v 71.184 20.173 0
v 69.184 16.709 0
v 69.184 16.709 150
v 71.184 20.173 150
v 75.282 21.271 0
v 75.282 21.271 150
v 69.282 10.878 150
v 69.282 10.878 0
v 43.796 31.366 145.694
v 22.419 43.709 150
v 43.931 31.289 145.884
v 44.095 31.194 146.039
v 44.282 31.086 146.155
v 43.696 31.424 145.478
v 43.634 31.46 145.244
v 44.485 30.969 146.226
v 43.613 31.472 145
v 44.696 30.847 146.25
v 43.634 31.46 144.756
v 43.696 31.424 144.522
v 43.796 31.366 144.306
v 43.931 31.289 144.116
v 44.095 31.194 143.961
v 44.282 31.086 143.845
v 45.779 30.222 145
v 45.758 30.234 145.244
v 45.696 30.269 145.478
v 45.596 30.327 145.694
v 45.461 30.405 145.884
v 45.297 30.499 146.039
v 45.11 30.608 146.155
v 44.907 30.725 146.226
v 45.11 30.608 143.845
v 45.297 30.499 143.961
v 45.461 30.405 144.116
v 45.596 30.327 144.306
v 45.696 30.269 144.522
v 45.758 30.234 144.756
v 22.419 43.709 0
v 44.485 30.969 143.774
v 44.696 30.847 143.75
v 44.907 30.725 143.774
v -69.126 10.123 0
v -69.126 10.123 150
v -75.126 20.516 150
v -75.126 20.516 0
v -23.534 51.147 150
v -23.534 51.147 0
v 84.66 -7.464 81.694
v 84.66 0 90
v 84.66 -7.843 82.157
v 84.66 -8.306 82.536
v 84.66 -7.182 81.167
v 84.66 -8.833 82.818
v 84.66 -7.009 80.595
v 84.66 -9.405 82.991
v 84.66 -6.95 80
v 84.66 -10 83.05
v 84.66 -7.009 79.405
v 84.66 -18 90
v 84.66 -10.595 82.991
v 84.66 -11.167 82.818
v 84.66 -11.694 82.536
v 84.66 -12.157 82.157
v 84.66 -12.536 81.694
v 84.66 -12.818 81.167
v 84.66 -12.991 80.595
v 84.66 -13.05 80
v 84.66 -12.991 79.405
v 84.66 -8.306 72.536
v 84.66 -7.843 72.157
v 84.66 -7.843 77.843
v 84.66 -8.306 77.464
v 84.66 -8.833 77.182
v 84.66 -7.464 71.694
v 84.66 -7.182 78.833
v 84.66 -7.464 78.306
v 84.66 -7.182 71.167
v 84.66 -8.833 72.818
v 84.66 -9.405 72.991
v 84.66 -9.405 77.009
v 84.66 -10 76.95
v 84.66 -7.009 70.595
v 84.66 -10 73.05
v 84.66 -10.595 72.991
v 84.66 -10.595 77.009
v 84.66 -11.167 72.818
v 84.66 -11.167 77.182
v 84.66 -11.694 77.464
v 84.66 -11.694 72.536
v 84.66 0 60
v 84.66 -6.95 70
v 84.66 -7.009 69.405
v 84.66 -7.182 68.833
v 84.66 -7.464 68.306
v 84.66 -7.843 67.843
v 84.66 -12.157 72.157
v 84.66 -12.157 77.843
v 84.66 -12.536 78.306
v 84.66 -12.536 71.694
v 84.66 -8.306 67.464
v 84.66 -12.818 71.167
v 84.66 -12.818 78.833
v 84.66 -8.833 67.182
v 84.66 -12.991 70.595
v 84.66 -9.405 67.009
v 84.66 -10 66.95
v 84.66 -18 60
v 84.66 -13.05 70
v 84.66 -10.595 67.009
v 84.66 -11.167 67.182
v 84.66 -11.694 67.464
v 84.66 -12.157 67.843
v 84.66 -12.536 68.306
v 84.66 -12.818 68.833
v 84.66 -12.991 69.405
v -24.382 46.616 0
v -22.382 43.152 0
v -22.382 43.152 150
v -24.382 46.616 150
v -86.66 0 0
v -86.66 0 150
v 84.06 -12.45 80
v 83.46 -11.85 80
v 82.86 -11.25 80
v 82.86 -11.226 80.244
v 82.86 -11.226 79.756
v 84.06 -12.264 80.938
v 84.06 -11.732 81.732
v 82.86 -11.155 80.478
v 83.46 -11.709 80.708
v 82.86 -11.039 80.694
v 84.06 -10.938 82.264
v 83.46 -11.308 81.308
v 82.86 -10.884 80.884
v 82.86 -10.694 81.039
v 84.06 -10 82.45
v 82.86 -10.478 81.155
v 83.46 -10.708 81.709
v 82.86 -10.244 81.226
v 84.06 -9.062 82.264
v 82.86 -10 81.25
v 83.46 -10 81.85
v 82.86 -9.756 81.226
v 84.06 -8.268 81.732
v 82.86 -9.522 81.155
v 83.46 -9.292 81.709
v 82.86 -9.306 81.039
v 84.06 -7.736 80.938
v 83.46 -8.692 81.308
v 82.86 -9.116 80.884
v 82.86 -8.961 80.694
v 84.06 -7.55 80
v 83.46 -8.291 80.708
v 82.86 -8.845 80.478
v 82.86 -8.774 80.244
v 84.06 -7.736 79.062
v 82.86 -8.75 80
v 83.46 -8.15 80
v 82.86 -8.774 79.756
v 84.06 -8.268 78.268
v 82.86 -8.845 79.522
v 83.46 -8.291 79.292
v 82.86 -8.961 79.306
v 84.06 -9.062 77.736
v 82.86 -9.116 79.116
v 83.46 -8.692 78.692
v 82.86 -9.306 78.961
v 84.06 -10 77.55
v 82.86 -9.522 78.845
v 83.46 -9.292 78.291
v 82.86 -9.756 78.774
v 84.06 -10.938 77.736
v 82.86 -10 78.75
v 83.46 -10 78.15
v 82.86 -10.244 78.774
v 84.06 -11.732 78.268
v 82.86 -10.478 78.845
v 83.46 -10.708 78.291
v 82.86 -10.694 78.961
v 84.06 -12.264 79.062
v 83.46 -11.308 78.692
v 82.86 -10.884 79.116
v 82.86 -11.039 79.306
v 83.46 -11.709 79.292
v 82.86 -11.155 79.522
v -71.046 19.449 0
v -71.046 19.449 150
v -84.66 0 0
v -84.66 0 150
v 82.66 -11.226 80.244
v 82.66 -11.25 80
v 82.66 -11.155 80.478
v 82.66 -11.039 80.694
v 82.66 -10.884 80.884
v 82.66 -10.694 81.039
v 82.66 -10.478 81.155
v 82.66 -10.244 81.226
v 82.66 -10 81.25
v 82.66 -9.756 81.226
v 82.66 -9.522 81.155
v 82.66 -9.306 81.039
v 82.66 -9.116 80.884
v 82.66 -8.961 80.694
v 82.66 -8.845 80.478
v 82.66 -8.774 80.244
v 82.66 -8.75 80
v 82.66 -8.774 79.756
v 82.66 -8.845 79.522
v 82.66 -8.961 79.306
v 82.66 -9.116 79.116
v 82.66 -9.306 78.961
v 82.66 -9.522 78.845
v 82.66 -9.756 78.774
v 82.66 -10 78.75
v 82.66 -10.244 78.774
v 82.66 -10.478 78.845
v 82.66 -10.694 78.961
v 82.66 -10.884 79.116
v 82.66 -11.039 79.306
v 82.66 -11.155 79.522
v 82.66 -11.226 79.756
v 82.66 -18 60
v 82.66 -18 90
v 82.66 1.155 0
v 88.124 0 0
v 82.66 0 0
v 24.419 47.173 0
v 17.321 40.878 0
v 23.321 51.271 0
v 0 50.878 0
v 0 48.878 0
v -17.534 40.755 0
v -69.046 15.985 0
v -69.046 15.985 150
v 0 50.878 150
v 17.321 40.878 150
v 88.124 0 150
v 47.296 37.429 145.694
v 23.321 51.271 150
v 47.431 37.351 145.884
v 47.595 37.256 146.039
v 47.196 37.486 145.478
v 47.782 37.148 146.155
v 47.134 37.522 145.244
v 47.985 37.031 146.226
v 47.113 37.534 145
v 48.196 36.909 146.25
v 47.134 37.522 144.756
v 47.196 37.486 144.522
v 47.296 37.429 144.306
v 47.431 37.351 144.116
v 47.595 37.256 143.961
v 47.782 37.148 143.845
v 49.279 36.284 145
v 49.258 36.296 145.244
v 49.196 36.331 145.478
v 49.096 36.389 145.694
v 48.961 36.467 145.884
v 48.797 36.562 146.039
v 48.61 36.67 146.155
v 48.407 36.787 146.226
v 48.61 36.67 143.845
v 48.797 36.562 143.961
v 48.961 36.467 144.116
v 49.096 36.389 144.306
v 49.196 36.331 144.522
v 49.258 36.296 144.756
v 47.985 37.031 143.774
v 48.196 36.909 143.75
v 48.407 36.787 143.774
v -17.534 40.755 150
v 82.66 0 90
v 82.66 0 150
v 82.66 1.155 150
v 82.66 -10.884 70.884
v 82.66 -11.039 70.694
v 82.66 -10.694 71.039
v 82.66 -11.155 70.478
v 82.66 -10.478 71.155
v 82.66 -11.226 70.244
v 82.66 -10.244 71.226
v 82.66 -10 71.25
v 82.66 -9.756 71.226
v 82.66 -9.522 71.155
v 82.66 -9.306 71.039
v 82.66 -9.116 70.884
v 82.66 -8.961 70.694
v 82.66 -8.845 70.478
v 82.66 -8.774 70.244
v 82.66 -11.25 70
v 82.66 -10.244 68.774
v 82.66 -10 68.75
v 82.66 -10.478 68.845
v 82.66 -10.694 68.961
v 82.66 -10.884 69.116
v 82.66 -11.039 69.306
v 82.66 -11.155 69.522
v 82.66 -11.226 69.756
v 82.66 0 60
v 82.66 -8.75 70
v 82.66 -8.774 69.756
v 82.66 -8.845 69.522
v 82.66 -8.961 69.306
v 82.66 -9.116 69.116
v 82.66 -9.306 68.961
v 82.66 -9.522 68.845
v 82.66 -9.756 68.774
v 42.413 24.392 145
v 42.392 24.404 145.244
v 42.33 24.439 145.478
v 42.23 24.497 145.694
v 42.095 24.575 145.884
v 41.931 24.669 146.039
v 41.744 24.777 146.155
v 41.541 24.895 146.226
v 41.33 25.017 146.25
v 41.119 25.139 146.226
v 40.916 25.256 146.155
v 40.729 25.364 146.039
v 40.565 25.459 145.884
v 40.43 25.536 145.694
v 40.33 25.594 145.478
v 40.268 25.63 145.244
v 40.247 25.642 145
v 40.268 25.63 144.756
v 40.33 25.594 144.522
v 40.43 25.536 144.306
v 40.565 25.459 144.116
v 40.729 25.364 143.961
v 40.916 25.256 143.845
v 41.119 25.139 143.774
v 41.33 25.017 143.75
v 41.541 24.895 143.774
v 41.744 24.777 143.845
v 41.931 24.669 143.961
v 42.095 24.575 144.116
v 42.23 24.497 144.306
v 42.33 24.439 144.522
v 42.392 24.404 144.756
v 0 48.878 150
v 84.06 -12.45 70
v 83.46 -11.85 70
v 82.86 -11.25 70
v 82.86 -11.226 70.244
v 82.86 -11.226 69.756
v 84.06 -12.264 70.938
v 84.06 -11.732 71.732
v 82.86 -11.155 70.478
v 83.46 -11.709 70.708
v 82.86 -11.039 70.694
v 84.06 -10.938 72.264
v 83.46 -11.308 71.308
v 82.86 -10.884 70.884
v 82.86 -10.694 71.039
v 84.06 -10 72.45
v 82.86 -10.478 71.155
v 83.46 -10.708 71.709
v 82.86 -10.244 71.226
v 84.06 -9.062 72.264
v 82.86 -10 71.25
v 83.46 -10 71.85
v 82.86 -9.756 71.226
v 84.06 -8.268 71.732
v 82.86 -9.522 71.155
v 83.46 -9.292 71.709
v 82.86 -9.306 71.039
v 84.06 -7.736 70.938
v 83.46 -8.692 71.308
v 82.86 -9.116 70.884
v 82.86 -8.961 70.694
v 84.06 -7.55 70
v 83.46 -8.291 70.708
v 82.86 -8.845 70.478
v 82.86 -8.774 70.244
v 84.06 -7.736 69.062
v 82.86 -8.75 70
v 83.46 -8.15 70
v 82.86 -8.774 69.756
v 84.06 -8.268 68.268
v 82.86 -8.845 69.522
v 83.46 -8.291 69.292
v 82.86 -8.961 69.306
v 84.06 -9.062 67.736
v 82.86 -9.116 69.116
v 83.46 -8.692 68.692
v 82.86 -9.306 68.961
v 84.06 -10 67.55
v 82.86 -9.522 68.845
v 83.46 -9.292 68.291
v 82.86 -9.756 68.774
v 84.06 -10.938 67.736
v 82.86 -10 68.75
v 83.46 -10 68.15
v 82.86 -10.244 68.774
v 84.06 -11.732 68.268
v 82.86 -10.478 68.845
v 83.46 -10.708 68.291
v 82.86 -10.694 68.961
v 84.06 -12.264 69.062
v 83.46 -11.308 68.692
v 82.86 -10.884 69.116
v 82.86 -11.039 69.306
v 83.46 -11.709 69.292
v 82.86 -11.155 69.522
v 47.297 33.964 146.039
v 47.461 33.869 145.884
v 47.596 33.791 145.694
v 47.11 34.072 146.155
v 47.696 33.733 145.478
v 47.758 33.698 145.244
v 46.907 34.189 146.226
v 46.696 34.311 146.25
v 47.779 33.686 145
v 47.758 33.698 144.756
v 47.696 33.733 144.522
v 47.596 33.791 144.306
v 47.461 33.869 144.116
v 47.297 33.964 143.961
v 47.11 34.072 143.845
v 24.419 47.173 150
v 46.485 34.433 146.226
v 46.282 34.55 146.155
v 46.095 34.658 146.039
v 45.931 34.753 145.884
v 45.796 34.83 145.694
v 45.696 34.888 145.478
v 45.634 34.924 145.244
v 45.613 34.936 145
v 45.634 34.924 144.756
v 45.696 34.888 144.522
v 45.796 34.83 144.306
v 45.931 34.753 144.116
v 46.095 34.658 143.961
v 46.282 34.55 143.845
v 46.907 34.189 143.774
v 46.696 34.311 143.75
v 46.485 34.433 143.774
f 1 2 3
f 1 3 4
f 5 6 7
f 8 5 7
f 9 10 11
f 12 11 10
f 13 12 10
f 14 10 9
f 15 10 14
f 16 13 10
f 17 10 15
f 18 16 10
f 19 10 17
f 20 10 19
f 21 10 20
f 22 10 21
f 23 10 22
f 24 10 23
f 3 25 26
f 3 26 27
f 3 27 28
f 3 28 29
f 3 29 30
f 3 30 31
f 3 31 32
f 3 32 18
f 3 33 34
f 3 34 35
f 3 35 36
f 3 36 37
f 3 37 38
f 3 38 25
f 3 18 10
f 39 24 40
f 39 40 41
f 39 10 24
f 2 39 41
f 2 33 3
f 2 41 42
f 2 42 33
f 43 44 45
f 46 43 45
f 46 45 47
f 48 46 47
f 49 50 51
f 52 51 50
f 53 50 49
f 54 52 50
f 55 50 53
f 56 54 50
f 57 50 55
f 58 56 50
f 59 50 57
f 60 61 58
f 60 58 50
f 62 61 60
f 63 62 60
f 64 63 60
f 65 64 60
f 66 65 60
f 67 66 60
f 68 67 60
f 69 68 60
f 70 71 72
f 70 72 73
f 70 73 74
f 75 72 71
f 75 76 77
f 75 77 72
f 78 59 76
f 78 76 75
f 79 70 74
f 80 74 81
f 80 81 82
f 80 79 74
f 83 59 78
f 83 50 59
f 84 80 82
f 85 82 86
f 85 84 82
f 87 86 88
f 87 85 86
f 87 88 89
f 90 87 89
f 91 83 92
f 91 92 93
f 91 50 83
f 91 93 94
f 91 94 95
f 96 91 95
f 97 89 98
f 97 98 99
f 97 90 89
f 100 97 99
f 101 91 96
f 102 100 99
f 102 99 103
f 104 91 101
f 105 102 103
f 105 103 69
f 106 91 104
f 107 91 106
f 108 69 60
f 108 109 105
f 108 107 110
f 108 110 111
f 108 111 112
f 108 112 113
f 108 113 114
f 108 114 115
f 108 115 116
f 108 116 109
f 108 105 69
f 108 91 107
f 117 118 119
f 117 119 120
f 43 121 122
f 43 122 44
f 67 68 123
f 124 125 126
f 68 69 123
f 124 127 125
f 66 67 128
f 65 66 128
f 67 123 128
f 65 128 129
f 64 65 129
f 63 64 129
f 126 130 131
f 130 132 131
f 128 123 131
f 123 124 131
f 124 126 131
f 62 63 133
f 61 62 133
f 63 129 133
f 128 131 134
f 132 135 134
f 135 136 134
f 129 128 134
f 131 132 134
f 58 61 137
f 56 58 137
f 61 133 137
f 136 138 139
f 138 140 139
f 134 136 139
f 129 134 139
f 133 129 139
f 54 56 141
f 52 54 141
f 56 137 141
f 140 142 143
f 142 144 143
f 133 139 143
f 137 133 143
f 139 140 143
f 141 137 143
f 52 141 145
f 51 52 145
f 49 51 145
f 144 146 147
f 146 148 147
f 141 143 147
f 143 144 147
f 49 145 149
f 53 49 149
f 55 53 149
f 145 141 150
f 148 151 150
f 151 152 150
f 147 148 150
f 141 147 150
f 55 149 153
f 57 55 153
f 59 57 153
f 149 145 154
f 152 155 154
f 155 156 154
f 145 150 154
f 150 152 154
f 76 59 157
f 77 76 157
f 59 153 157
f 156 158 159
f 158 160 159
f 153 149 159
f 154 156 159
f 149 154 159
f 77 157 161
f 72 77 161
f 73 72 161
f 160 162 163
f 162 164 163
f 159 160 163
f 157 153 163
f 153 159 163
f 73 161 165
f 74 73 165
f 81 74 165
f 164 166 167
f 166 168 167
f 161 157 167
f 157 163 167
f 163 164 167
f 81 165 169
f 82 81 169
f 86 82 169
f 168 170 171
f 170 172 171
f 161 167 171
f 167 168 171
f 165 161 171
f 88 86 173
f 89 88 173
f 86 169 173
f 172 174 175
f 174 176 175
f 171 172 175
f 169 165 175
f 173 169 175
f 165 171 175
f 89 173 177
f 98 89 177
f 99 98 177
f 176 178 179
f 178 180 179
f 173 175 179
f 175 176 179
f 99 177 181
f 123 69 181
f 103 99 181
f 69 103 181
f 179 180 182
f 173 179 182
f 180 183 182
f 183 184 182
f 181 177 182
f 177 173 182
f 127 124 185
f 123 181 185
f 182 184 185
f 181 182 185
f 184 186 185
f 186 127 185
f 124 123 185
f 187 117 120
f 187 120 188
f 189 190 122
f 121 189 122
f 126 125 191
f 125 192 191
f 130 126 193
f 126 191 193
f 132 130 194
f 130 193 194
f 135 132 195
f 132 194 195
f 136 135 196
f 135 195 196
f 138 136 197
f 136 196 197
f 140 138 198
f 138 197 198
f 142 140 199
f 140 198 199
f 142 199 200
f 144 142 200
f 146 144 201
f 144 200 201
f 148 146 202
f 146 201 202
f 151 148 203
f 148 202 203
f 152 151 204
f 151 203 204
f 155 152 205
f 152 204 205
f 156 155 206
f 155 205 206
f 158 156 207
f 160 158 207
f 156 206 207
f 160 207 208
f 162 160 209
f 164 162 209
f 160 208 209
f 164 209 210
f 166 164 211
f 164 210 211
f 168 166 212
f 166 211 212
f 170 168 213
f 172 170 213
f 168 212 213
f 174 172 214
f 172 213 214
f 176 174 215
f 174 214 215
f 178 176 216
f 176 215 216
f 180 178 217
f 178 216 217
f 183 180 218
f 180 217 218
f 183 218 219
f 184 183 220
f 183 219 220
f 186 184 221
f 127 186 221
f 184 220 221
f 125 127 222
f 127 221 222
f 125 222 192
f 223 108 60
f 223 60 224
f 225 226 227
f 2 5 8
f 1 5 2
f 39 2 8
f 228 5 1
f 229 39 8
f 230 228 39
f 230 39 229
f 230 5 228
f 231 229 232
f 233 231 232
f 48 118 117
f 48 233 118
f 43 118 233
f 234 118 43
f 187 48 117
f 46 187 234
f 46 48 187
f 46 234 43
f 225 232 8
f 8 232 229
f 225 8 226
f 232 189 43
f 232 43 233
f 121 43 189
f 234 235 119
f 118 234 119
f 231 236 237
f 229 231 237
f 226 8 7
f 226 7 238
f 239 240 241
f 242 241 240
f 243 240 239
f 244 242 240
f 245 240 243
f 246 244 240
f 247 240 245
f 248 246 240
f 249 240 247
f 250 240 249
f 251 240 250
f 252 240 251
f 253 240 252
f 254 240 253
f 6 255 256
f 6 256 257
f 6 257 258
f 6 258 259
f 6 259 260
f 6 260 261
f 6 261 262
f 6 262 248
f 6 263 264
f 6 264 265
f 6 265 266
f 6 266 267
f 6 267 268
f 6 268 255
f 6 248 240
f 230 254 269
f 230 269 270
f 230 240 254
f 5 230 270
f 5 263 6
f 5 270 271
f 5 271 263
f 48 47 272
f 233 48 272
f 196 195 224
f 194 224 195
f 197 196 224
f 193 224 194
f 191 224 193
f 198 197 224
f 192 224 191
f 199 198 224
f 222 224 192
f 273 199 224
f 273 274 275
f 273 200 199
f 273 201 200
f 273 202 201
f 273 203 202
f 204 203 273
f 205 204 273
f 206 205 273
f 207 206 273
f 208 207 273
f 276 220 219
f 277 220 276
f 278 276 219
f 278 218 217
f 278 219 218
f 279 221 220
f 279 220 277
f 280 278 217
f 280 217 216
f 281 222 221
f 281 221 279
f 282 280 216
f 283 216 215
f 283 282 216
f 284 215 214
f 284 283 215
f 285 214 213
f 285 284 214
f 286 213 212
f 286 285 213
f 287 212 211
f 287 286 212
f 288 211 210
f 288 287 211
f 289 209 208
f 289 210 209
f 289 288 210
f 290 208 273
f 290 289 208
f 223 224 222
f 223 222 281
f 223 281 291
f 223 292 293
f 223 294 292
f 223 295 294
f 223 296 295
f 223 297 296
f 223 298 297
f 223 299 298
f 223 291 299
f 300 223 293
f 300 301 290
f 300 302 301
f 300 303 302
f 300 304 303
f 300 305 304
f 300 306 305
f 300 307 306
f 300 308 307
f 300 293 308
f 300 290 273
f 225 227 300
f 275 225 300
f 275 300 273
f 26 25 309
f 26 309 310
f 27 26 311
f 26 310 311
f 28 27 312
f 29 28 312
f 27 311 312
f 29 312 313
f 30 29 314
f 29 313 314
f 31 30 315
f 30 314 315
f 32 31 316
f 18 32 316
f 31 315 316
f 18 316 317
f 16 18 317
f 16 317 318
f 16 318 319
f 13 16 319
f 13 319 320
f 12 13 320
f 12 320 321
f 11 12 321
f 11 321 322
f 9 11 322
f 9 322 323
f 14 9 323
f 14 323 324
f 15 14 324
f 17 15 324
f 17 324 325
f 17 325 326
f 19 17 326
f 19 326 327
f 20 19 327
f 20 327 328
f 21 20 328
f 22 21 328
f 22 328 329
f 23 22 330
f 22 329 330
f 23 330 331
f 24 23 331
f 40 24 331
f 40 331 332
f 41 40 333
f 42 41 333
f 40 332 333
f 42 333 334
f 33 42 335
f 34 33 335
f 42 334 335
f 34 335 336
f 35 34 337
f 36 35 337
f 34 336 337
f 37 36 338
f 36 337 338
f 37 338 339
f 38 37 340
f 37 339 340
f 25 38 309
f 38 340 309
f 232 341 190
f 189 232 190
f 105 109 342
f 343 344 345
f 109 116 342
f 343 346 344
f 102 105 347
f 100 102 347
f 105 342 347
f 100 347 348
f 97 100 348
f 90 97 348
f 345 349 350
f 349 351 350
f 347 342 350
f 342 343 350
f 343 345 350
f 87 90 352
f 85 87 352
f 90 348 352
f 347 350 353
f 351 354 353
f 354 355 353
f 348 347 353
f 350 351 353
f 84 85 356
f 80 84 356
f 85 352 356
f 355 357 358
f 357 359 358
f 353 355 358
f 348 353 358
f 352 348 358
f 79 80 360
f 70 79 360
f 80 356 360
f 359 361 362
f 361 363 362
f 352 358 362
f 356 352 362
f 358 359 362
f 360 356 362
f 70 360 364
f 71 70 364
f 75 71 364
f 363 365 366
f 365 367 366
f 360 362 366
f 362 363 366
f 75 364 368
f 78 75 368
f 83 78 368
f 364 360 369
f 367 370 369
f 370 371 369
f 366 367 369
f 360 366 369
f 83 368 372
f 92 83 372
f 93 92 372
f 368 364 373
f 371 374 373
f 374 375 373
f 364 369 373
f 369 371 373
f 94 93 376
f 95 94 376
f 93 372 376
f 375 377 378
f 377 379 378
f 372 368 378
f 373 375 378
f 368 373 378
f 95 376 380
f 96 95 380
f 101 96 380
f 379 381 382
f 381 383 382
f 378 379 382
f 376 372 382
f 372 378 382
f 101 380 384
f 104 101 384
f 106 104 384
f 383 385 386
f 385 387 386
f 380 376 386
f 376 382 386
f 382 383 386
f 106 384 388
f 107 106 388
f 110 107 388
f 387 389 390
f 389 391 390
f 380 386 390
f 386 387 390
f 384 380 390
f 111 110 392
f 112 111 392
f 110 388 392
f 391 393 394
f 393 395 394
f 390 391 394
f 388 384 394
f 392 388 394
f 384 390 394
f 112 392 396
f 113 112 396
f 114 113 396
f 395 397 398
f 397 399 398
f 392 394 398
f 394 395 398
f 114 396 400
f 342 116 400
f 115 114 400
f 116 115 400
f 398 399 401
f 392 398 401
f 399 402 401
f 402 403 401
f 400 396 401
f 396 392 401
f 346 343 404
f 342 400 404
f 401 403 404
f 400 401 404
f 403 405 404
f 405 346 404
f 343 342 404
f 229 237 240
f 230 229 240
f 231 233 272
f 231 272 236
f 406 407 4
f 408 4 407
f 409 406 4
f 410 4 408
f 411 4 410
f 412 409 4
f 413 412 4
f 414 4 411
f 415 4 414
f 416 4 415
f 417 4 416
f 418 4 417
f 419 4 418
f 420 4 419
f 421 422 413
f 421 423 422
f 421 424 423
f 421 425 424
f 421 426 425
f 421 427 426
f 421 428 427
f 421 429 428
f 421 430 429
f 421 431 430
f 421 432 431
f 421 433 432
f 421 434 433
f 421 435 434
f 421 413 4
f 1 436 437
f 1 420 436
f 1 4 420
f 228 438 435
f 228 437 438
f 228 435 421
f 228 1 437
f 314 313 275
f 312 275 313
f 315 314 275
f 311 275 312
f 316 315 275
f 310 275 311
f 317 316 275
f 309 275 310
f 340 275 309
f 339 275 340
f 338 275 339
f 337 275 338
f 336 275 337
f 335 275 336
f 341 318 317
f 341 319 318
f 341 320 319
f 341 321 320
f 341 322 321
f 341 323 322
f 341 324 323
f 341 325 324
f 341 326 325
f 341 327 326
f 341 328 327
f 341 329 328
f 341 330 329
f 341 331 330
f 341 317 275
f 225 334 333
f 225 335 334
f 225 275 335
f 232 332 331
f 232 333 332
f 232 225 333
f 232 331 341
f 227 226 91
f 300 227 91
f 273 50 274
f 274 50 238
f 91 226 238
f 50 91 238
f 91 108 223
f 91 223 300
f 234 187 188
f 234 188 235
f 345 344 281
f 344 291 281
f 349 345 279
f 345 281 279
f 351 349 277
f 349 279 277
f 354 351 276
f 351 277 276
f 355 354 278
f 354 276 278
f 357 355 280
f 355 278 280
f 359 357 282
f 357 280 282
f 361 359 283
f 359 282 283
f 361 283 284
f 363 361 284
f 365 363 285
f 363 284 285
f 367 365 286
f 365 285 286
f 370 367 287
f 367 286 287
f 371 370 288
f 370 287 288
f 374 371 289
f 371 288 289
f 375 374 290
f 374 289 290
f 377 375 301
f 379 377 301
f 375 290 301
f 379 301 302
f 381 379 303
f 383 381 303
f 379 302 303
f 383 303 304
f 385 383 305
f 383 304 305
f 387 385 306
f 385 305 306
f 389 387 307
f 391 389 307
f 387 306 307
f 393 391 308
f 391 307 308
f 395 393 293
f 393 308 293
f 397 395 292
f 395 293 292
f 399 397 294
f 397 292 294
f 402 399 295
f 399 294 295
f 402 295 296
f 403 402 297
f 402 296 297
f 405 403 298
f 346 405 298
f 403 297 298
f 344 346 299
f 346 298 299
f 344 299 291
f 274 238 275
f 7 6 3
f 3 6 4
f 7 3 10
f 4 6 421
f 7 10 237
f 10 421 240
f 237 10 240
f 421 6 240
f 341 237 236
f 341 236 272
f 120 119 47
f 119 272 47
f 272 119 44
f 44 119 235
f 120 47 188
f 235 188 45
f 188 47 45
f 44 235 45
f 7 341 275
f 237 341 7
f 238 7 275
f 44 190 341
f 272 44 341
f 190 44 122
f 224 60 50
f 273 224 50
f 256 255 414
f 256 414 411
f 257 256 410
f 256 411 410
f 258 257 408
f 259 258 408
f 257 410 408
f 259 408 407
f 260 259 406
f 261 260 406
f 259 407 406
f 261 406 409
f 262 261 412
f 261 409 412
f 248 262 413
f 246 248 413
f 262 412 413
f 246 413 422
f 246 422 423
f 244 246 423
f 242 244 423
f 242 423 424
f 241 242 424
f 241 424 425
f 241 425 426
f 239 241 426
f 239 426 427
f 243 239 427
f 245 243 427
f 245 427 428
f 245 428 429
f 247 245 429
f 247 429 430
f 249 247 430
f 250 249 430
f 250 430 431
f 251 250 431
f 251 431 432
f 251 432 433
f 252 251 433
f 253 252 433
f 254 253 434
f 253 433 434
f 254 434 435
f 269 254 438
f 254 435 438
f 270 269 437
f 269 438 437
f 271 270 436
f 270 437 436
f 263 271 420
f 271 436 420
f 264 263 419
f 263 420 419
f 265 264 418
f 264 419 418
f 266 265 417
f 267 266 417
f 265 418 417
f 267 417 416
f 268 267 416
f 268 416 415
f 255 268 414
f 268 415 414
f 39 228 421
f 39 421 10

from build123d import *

# Parameters (mm, degrees)
PAD_DEPTH        = 150
SKETCH001_W      = 46.435574
SKETCH001_H      = 60
POCKET_DEPTH     = 5
HOLE_D           = 2.5
HOLE_DEPTH       = 25
HOLE_CSINK_D     = 6.1
HOLE_CSINK_ANGLE = 90
HOLE_TIPS_R      = 1.25
SKETCH011_R      = 1.25
HOLE001_DEPTH    = 25
HOLE001_TIPS_R   = 1.25


with BuildPart() as part:
    # Sketch → Pad (new body)
    with BuildSketch(Plane.XY):
        Polygon((82.66, 1.154701), (0, 48.878474), (-84.66, 0), (-86.66, 0), (-69.125816, 10.123366), (-75.125816, 20.515671), (-23.534184, 51.147413), (-17.534184, 40.755108), (0, 50.878474), (17.320508, 40.878474), (23.320508, 51.270779), (75.282032, 21.270779), (69.282032, 10.878474), (88.124102, 0), (84.66, 0), (84.66, -18), (82.66, -18), align=None)
        Polygon((-71.046234, 19.449182), (-69.046234, 15.98508), (-22.381715, 43.151724), (-24.381715, 46.615825), align=None, mode=Mode.SUBTRACT)
        Polygon((69.183956, 16.708601), (71.183956, 20.172702), (24.418584, 47.172702), (22.418584, 43.708601), align=None, mode=Mode.SUBTRACT)
    extrude(amount=PAD_DEPTH)

    # Sketch001 (on Face1 of Pad) → Pocket (cut)
    with BuildSketch(Plane.YZ.offset(84.66)):
        with Locations((-23.217787, 30)):
            Rectangle(SKETCH001_W, SKETCH001_H)
        with Locations((-23.217787, 120)):
            Rectangle(SKETCH001_W, SKETCH001_H)
    extrude(amount=-POCKET_DEPTH, mode=Mode.SUBTRACT)

    # Hole
    with Locations(Plane.YZ.offset(84.66)):
        with Locations((-10, 80), (-10, 70)):
            CounterSinkHole(HOLE_D / 2, HOLE_CSINK_D / 2, depth=HOLE_DEPTH, counter_sink_angle=HOLE_CSINK_ANGLE)

    # Hole tips → Hole tip 1 section 0
    with BuildSketch(Plane.YZ.offset(59.66), mode=Mode.PRIVATE) as hole_tip_1_s0:
        with Locations((-10, 80)):
            Circle(HOLE_TIPS_R)
    loft([hole_tip_1_s0.sketch, Vertex(58.908924, -10, 80)], mode=Mode.SUBTRACT)

    # Hole tips → Hole tip 2 section 0
    with BuildSketch(Plane.YZ.offset(59.66), mode=Mode.PRIVATE) as hole_tip_2_s0:
        with Locations((-10, 70)):
            Circle(HOLE_TIPS_R)
    loft([hole_tip_2_s0.sketch, Vertex(58.908924, -10, 70)], mode=Mode.SUBTRACT)

    # Sketch011 (on Face14 of Hole) → Hole001 (cut)
    with BuildSketch(Plane(origin=(21.165, 36.658855, 0), x_dir=(0.866025, -0.5, 0), z_dir=(-0.5, -0.866025, 0))):
        with Locations((23.284536, 145)):
            Circle(SKETCH011_R)
    extrude(amount=-HOLE001_DEPTH, mode=Mode.SUBTRACT)

    # Hole001 tips → Hole001 tip 1 section 0
    with BuildSketch(Plane(origin=(33.665, 58.30949, 0), x_dir=(0.866025, -0.5, 0), z_dir=(-0.5, -0.866025, 0)), mode=Mode.PRIVATE) as hole001_tip_1_s0:
        with Locations((23.284536, 145)):
            Circle(HOLE001_TIPS_R)
    loft([hole001_tip_1_s0.sketch, Vertex(54.205538, 47.317673, 145)], mode=Mode.SUBTRACT)


solid = part.part
